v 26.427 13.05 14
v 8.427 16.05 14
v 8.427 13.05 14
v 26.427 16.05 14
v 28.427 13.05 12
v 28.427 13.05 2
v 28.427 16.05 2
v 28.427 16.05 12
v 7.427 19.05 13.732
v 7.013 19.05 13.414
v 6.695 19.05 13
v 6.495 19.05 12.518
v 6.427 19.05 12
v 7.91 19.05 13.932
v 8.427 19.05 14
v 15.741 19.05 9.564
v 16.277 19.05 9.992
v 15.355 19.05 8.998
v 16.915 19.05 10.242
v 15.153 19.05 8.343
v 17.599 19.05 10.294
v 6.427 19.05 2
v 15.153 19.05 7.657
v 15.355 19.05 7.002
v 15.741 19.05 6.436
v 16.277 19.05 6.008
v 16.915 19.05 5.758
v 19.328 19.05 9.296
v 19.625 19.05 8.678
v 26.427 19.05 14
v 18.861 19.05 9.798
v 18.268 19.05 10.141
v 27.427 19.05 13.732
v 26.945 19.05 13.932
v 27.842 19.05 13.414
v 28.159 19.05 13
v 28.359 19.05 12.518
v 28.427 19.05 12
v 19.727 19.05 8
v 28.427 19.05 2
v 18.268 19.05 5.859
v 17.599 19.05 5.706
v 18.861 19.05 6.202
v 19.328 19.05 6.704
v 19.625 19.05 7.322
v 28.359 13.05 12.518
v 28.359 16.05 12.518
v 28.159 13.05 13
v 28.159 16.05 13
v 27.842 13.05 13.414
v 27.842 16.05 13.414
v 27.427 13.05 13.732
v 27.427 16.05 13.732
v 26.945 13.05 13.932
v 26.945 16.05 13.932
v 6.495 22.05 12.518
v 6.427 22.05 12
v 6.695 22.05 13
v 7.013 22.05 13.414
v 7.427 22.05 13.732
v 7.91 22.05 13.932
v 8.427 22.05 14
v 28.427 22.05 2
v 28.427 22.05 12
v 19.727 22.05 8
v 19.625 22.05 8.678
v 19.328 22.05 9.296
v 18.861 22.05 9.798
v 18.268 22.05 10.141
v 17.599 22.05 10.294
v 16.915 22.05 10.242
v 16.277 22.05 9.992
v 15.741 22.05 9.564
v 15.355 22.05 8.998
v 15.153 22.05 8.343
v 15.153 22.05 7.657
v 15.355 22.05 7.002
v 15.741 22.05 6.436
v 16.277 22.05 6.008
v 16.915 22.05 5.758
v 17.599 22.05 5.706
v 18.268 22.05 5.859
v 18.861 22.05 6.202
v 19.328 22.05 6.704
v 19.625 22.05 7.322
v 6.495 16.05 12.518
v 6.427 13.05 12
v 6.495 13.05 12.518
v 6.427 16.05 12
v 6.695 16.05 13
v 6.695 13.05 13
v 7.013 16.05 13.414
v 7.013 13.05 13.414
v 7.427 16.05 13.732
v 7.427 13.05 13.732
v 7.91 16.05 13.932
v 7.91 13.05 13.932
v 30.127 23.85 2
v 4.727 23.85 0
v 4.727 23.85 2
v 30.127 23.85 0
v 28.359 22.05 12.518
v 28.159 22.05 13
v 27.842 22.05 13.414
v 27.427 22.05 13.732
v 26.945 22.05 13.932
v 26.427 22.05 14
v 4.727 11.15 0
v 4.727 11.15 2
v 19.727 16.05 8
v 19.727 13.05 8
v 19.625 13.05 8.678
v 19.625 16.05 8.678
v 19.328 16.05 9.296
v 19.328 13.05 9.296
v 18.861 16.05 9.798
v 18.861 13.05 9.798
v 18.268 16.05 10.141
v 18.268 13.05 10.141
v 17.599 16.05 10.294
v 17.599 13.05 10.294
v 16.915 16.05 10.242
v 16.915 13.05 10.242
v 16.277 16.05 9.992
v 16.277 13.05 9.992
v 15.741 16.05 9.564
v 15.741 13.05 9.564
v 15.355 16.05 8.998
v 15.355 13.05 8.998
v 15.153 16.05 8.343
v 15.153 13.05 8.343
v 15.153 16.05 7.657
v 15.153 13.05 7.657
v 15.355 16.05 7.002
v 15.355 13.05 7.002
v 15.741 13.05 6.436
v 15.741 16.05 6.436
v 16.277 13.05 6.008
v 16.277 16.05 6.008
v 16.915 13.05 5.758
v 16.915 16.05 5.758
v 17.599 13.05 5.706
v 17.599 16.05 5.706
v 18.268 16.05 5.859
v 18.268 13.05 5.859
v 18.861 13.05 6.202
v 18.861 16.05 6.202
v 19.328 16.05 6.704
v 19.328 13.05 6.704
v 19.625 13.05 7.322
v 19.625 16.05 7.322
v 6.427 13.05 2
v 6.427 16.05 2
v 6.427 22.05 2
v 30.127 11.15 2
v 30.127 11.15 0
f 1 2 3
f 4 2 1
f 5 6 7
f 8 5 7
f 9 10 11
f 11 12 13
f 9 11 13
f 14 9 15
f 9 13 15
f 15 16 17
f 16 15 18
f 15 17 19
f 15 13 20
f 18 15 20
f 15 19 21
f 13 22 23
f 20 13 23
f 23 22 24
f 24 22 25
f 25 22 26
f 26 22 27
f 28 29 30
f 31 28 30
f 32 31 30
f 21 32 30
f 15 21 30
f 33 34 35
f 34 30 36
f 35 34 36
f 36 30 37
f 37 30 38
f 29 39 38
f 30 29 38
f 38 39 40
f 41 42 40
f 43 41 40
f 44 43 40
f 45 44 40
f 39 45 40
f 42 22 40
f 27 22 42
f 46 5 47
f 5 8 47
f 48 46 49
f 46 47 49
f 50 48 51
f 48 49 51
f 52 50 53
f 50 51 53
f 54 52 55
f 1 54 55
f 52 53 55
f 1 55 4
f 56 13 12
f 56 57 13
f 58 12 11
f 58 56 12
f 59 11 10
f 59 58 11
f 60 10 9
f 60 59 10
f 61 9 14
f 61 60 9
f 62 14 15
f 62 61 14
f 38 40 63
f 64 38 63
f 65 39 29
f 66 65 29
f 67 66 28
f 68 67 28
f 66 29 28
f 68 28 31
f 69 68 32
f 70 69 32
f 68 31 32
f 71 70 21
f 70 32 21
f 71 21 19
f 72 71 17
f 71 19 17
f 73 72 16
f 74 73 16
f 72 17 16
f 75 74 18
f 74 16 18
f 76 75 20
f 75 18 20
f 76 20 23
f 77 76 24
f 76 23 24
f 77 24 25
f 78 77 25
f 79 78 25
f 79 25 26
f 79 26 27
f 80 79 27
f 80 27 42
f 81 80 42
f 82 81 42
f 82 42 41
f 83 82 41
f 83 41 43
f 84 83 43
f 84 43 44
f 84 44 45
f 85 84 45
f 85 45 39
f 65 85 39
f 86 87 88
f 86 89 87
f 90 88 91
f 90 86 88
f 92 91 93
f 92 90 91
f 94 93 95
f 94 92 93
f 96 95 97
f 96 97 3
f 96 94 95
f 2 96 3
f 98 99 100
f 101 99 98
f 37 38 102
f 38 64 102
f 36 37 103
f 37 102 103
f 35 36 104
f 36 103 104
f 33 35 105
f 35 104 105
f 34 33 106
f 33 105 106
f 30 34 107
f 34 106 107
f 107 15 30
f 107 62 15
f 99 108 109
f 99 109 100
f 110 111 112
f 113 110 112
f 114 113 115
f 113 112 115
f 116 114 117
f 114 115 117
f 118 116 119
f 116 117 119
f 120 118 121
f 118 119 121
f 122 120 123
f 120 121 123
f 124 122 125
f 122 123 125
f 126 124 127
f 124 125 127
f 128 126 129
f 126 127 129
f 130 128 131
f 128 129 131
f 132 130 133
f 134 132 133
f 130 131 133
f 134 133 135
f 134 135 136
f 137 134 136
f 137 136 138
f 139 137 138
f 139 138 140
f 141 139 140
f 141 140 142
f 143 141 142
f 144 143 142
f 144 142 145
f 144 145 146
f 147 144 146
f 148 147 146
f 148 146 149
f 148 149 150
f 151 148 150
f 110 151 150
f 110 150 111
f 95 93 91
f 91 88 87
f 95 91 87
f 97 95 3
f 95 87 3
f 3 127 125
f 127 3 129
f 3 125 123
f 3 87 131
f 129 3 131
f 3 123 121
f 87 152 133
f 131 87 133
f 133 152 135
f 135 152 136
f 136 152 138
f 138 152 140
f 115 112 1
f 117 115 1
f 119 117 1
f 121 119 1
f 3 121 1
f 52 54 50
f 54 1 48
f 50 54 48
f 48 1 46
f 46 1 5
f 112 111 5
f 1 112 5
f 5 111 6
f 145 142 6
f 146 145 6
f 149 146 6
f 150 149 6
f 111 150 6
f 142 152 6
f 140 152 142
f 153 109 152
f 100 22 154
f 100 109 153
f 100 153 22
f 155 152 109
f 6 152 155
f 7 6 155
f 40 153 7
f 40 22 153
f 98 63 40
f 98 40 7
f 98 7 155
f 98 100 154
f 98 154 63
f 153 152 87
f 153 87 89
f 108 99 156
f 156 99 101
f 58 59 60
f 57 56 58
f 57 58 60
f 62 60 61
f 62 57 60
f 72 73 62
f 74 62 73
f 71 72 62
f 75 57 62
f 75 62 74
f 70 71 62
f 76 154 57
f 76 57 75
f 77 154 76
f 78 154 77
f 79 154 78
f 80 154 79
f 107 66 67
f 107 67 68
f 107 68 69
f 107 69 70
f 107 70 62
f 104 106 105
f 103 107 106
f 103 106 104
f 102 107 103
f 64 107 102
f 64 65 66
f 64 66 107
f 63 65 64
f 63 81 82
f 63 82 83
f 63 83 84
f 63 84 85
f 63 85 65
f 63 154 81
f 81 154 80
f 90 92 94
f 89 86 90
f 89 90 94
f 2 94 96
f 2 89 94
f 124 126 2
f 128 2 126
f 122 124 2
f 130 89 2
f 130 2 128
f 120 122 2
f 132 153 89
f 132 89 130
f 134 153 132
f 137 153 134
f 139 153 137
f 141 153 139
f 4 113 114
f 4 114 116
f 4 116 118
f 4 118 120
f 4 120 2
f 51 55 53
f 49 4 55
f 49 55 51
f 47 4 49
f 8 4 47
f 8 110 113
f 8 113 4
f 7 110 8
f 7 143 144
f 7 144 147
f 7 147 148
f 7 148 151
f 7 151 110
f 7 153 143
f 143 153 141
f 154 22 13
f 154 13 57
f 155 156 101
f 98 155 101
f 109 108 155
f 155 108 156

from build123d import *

# Parameters (mm, degrees)
F0_W     = 25.4
F0_H     = 12.7
F1_DEPTH = 2
F2_W     = 22
F2_H     = 3
F3_DEPTH = 12
F4_R     = 2.3
F5_DEPTH = 25
F6_R     = 2


with BuildPart() as f1:
    # F0 (on Top) → F1 (new body)
    with BuildSketch(Plane.XY):
        with Locations((17.427291, 17.500329)):
            Rectangle(F0_W, F0_H)
    extrude(amount=F1_DEPTH)

    # F2 (on face) → F3 (join)
    with BuildSketch(Plane.XY.offset(2)):
        with Locations((17.427291, 20.550329)):
            Rectangle(F2_W, F2_H)
        with Locations((17.427291, 14.550329)):
            Rectangle(F2_W, F2_H)
    extrude(amount=F3_DEPTH)

    # F4 (on face) → F5 (cut)
    with BuildSketch(Plane.XZ.offset(-13.050329)):
        with Locations((17.427291, 8)):
            Circle(F4_R)
    extrude(amount=-F5_DEPTH, mode=Mode.SUBTRACT)

    # F6
    f6_edges = [f1.edges().sort_by_distance(p)[0] for p in [
        (6.427291, 20.550329, 14),
        (6.427291, 14.550329, 14),
        (28.427291, 20.550329, 14),
        (28.427291, 14.550329, 14),
    ]]
    fillet(f6_edges, radius=F6_R)


solid = f1.part
